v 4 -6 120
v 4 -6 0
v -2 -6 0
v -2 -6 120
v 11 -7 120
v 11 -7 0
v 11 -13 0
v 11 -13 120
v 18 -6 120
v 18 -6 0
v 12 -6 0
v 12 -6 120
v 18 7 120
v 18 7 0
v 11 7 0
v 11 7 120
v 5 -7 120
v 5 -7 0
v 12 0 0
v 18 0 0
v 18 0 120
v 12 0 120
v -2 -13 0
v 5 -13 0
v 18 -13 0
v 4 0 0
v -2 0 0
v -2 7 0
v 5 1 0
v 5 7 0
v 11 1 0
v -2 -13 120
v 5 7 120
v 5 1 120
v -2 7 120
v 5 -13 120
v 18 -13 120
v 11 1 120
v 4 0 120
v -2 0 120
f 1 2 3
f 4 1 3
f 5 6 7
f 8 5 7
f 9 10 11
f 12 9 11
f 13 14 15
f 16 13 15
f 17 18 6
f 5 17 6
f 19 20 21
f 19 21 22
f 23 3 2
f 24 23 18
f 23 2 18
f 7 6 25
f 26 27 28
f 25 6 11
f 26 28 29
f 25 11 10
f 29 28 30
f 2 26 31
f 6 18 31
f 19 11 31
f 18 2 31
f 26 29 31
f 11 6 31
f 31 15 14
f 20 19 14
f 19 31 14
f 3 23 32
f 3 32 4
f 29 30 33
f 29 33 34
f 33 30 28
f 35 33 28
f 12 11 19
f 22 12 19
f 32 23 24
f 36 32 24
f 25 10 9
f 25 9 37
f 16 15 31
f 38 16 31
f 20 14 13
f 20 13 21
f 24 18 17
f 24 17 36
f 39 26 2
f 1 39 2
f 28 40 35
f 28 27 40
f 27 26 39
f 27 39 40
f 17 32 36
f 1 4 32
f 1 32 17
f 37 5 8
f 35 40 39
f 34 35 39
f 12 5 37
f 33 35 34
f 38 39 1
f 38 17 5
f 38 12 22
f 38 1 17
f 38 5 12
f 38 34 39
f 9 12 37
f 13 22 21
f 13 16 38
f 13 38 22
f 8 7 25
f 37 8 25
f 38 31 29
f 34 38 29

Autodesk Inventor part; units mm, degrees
ref_plane "YZ Plane" through (0, 0, 0) normal (1, 0, 0) x (0, 1, 0)
ref_plane "XZ Plane" through (0, 0, 0) normal (0, 1, 0) x (-1, 0, 0)
ref_plane "XY Plane" through (0, 0, 0) normal (0, 0, 1) x (1, 0, 0)
sketch "Sketch1" plane through (0, 0, 0) normal (0, 0, 1) x (1, 0, 0)
  line L0 (18, 7) -> (-162, 7) projected
  line L1 (-162, 0) -> (-162, 7) projected
  line L2 (18, 0) -> (-162, 0) projected
  line L3 (18, 7) -> (18, 0) projected
  line L4 (18, -6) -> (-162, -6) projected
  line L5 (-162, -13) -> (-162, -6) projected
  line L6 (-162, -13) -> (18, -13) projected
  line L7 (18, -6) -> (18, -13) projected
  line L8 (18, 0) -> (18, -6) projected
  line L9 (18, 7) -> (11, 7)
  line L10 (11, 7) -> (11, 0)
  line L11 (11, 0) -> (18, 0)
  line L12 (18, 0) -> (18, 7)
  line L13 (18, -6) -> (11, -6)
  line L14 (11, -6) -> (11, -13)
  line L15 (11, -13) -> (18, -13)
  line L16 (18, -13) -> (18, -6)
  line L17 (5, -13) -> (-2, -13)
  line L18 (-2, -13) -> (-2, -6)
  line L19 (-2, -6) -> (5, -6)
  line L20 (5, -6) -> (5, -13)
  line L21 (5, 0) -> (-2, 0)
  line L22 (-2, 0) -> (-2, 7)
  line L23 (-2, 7) -> (5, 7)
  line L24 (5, 7) -> (5, 0)
  line L25 (12, 1) -> (4, 1)
  line L26 (4, 1) -> (4, -7)
  line L27 (4, -7) -> (12, -7)
  line L28 (12, -7) -> (12, 1)
  point P0 (0, 0)
  point P1 (12, 0)
  point P2 (11, 1)
  point P3 (5, 1)
  point P4 (-2, 0)
  point P5 (4, 0)
  point P6 (4, -6)
  point P7 (-2, -13)
  point P8 (5, -7)
  point P9 (11, -7)
  point P10 (12, -6)
  dimension "d0" = 7
  dimension "d1" = 7
  dimension "d2" = 7
  dimension "d3" = 7
  dimension "d4" = 7
  dimension "d5" = 7
  dimension "d6" = 7
  dimension "d7" = 7
  dimension "d8" = 6
  dimension "d9" = 8
  dimension "d10" = 8
  dimension "d11" = 1
  dimension "d12" = 1
extrude "Extrusion1" add sketch "Sketch1" along normal blind 120 contours L3 L2 L28 L25 L10 L0 | L24 L25 L26 L2 L22 L0 | L25 L28 L2 L10 | L10 L2 L24 L25 | L28 L4 L26 L2 | L7 L6 L14 L27 L28 L4 | L24 L2 L26 L25 | L28 L27 L14 L4 | L14 L27 L20 L4 | L20 L27 L26 L4 | L6 L18 L4 L26 L27 L20
properties part number "zbar"
